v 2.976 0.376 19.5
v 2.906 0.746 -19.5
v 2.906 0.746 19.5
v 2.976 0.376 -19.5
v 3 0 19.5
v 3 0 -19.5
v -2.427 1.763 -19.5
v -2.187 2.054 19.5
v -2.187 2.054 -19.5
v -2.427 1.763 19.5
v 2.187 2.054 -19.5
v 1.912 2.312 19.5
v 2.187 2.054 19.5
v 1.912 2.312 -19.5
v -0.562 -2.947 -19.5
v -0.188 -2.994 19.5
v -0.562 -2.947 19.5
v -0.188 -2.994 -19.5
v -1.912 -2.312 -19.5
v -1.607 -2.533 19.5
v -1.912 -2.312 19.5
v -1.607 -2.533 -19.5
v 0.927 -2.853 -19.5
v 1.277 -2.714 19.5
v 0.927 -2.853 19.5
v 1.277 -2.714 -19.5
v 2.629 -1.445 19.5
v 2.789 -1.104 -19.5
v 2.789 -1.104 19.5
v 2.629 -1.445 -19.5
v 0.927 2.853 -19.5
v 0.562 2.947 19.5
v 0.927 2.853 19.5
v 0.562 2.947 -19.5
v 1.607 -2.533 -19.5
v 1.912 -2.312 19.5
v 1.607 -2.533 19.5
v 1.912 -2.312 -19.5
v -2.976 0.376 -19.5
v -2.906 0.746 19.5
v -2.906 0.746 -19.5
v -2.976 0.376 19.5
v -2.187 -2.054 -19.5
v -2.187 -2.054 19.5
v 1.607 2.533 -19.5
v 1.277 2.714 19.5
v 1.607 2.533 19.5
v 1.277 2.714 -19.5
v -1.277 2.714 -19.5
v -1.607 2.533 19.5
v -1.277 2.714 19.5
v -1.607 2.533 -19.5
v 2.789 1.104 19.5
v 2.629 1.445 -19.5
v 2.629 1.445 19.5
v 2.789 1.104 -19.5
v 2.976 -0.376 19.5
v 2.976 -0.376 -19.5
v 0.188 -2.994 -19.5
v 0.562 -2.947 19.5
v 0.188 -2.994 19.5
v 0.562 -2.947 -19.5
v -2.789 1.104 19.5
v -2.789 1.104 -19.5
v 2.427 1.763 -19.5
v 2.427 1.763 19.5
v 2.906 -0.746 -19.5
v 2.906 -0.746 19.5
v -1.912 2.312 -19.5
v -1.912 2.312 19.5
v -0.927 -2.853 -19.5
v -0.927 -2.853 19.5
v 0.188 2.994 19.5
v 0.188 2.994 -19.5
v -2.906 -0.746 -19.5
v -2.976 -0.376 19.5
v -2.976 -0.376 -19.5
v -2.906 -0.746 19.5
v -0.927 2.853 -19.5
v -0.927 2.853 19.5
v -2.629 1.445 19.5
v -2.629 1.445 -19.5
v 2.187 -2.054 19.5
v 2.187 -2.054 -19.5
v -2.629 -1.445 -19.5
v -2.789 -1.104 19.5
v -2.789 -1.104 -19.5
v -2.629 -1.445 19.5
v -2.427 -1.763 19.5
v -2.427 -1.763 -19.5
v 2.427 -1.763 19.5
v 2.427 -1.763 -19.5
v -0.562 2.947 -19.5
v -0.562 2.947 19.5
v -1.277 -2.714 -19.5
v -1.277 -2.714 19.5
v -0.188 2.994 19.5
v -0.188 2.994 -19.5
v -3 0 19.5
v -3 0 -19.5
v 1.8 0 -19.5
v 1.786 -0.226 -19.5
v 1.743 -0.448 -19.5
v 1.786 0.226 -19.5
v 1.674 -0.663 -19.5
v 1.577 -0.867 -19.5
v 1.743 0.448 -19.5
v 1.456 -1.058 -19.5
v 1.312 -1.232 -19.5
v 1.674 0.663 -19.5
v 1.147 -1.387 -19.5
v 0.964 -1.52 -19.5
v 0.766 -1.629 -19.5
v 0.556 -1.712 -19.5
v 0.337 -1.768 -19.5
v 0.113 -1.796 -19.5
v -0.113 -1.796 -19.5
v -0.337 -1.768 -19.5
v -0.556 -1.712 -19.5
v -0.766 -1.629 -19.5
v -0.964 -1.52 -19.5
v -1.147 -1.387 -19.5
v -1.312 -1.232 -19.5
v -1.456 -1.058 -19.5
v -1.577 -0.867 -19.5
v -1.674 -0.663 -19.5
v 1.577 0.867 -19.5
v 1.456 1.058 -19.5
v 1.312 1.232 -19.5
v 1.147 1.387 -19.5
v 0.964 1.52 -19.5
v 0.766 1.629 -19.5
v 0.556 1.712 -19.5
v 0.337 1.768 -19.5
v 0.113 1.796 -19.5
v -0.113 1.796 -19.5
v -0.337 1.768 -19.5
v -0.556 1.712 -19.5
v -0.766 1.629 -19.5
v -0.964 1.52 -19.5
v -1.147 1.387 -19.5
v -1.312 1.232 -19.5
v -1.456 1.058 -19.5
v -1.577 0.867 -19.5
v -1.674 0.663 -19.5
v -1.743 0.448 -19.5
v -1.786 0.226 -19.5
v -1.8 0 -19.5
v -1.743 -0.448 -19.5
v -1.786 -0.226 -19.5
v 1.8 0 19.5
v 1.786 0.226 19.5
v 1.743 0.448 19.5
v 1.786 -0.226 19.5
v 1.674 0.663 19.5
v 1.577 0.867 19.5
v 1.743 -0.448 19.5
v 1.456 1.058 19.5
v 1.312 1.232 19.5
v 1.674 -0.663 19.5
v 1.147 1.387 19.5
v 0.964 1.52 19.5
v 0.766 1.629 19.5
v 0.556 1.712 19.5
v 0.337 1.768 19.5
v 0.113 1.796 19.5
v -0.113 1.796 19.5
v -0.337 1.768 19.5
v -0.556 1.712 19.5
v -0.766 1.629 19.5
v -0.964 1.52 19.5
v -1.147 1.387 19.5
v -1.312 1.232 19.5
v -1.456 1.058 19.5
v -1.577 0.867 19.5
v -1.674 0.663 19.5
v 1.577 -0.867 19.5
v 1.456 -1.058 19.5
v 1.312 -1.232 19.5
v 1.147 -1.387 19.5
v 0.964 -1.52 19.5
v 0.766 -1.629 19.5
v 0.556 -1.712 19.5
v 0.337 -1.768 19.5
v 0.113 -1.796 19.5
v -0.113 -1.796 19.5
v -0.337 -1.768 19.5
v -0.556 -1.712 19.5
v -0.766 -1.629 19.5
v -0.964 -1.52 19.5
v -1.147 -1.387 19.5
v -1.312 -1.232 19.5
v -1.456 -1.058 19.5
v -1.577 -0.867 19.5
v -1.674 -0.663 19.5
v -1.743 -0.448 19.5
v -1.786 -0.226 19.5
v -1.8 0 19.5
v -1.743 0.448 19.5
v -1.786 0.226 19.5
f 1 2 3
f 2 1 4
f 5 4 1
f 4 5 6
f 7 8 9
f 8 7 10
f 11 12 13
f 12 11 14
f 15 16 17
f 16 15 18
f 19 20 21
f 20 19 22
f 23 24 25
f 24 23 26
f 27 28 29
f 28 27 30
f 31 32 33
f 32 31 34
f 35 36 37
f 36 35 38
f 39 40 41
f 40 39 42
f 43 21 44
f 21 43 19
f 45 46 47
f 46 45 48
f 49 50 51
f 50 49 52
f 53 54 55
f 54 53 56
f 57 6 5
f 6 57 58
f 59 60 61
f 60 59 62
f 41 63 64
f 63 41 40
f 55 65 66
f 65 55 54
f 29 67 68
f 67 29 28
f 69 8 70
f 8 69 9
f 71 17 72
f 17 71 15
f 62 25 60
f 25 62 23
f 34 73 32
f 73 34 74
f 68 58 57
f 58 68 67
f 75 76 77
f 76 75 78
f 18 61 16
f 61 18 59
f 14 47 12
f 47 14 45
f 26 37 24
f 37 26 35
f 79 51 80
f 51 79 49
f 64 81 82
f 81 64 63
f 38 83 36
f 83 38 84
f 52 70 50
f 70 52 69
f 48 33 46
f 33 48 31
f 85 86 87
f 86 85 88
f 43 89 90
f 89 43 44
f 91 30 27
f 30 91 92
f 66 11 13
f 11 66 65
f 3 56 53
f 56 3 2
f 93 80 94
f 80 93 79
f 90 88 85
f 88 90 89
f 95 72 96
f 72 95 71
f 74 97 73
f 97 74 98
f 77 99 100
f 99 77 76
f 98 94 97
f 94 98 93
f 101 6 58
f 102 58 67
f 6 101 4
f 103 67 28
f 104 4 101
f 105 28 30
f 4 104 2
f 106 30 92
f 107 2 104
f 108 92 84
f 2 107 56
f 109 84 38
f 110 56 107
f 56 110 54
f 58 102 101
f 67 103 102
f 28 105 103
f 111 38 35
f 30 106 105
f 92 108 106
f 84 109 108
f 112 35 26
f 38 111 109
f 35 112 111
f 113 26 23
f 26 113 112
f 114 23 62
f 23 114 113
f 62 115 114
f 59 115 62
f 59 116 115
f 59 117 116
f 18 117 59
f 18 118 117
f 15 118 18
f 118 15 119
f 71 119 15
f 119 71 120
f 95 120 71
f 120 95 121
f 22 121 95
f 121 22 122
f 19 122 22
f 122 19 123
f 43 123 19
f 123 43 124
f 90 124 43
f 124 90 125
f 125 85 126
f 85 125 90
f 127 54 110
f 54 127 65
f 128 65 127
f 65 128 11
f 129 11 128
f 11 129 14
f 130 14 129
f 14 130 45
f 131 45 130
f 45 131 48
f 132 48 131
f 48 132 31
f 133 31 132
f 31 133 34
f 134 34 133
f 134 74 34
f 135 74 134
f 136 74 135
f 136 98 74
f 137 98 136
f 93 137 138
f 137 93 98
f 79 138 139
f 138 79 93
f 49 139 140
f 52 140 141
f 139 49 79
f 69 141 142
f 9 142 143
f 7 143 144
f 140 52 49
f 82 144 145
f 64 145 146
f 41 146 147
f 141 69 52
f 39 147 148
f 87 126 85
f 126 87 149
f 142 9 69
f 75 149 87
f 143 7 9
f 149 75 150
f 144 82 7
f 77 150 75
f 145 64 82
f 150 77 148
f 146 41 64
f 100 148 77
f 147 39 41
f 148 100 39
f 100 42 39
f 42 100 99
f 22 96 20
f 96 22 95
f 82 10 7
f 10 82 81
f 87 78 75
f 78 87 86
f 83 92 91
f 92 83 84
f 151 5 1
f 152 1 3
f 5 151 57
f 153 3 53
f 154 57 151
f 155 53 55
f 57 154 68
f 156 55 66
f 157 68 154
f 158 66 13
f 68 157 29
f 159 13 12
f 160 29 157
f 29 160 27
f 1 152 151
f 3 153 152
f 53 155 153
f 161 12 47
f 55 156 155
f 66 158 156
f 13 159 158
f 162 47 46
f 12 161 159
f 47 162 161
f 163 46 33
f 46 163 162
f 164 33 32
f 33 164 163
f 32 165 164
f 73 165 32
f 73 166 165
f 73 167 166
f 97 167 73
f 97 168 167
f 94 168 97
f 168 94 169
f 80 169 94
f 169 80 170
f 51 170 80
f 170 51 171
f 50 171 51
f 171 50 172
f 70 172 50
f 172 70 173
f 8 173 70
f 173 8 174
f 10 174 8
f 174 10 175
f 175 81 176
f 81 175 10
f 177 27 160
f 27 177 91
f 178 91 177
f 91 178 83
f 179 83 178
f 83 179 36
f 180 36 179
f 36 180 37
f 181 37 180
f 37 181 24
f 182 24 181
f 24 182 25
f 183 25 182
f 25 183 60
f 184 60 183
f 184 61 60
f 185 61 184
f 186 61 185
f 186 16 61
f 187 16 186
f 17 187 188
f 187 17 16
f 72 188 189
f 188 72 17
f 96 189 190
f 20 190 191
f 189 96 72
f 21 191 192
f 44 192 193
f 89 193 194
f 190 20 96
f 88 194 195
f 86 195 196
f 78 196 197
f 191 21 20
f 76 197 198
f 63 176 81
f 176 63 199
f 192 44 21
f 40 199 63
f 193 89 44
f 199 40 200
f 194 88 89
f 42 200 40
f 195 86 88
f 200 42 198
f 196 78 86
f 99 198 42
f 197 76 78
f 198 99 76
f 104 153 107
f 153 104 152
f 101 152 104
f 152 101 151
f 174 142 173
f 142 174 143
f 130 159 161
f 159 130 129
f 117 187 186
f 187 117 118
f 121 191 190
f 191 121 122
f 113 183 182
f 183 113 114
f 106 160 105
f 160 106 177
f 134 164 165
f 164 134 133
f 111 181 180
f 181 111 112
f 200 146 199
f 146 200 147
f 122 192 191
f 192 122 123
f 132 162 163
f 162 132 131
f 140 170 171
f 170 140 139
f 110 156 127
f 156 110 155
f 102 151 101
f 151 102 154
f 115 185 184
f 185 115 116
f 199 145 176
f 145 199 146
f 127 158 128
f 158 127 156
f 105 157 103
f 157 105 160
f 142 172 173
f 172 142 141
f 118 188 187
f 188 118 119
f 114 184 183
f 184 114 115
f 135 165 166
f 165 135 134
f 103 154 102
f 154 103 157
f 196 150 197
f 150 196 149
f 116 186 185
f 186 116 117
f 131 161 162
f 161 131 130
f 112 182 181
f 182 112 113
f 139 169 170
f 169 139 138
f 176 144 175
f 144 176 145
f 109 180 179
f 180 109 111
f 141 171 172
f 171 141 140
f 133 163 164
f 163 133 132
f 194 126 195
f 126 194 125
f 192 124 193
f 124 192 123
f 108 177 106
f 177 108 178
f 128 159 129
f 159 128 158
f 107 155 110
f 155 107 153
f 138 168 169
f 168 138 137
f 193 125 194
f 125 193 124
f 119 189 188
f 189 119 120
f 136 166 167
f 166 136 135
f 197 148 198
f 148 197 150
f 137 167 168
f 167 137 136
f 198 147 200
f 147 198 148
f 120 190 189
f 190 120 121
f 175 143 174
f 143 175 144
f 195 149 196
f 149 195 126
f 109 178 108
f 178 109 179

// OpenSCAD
$fn = 50;


difference() {
	union() {
		translate(v = [0, 0, -19.5000000000]) {
			cylinder(h = 39, r = 3.0000000000);
		}
	}
	union() {
		#translate(v = [0, 0, -100.0000000000]) {
			cylinder(h = 200, r = 1.8000000000);
		}
	}
}
